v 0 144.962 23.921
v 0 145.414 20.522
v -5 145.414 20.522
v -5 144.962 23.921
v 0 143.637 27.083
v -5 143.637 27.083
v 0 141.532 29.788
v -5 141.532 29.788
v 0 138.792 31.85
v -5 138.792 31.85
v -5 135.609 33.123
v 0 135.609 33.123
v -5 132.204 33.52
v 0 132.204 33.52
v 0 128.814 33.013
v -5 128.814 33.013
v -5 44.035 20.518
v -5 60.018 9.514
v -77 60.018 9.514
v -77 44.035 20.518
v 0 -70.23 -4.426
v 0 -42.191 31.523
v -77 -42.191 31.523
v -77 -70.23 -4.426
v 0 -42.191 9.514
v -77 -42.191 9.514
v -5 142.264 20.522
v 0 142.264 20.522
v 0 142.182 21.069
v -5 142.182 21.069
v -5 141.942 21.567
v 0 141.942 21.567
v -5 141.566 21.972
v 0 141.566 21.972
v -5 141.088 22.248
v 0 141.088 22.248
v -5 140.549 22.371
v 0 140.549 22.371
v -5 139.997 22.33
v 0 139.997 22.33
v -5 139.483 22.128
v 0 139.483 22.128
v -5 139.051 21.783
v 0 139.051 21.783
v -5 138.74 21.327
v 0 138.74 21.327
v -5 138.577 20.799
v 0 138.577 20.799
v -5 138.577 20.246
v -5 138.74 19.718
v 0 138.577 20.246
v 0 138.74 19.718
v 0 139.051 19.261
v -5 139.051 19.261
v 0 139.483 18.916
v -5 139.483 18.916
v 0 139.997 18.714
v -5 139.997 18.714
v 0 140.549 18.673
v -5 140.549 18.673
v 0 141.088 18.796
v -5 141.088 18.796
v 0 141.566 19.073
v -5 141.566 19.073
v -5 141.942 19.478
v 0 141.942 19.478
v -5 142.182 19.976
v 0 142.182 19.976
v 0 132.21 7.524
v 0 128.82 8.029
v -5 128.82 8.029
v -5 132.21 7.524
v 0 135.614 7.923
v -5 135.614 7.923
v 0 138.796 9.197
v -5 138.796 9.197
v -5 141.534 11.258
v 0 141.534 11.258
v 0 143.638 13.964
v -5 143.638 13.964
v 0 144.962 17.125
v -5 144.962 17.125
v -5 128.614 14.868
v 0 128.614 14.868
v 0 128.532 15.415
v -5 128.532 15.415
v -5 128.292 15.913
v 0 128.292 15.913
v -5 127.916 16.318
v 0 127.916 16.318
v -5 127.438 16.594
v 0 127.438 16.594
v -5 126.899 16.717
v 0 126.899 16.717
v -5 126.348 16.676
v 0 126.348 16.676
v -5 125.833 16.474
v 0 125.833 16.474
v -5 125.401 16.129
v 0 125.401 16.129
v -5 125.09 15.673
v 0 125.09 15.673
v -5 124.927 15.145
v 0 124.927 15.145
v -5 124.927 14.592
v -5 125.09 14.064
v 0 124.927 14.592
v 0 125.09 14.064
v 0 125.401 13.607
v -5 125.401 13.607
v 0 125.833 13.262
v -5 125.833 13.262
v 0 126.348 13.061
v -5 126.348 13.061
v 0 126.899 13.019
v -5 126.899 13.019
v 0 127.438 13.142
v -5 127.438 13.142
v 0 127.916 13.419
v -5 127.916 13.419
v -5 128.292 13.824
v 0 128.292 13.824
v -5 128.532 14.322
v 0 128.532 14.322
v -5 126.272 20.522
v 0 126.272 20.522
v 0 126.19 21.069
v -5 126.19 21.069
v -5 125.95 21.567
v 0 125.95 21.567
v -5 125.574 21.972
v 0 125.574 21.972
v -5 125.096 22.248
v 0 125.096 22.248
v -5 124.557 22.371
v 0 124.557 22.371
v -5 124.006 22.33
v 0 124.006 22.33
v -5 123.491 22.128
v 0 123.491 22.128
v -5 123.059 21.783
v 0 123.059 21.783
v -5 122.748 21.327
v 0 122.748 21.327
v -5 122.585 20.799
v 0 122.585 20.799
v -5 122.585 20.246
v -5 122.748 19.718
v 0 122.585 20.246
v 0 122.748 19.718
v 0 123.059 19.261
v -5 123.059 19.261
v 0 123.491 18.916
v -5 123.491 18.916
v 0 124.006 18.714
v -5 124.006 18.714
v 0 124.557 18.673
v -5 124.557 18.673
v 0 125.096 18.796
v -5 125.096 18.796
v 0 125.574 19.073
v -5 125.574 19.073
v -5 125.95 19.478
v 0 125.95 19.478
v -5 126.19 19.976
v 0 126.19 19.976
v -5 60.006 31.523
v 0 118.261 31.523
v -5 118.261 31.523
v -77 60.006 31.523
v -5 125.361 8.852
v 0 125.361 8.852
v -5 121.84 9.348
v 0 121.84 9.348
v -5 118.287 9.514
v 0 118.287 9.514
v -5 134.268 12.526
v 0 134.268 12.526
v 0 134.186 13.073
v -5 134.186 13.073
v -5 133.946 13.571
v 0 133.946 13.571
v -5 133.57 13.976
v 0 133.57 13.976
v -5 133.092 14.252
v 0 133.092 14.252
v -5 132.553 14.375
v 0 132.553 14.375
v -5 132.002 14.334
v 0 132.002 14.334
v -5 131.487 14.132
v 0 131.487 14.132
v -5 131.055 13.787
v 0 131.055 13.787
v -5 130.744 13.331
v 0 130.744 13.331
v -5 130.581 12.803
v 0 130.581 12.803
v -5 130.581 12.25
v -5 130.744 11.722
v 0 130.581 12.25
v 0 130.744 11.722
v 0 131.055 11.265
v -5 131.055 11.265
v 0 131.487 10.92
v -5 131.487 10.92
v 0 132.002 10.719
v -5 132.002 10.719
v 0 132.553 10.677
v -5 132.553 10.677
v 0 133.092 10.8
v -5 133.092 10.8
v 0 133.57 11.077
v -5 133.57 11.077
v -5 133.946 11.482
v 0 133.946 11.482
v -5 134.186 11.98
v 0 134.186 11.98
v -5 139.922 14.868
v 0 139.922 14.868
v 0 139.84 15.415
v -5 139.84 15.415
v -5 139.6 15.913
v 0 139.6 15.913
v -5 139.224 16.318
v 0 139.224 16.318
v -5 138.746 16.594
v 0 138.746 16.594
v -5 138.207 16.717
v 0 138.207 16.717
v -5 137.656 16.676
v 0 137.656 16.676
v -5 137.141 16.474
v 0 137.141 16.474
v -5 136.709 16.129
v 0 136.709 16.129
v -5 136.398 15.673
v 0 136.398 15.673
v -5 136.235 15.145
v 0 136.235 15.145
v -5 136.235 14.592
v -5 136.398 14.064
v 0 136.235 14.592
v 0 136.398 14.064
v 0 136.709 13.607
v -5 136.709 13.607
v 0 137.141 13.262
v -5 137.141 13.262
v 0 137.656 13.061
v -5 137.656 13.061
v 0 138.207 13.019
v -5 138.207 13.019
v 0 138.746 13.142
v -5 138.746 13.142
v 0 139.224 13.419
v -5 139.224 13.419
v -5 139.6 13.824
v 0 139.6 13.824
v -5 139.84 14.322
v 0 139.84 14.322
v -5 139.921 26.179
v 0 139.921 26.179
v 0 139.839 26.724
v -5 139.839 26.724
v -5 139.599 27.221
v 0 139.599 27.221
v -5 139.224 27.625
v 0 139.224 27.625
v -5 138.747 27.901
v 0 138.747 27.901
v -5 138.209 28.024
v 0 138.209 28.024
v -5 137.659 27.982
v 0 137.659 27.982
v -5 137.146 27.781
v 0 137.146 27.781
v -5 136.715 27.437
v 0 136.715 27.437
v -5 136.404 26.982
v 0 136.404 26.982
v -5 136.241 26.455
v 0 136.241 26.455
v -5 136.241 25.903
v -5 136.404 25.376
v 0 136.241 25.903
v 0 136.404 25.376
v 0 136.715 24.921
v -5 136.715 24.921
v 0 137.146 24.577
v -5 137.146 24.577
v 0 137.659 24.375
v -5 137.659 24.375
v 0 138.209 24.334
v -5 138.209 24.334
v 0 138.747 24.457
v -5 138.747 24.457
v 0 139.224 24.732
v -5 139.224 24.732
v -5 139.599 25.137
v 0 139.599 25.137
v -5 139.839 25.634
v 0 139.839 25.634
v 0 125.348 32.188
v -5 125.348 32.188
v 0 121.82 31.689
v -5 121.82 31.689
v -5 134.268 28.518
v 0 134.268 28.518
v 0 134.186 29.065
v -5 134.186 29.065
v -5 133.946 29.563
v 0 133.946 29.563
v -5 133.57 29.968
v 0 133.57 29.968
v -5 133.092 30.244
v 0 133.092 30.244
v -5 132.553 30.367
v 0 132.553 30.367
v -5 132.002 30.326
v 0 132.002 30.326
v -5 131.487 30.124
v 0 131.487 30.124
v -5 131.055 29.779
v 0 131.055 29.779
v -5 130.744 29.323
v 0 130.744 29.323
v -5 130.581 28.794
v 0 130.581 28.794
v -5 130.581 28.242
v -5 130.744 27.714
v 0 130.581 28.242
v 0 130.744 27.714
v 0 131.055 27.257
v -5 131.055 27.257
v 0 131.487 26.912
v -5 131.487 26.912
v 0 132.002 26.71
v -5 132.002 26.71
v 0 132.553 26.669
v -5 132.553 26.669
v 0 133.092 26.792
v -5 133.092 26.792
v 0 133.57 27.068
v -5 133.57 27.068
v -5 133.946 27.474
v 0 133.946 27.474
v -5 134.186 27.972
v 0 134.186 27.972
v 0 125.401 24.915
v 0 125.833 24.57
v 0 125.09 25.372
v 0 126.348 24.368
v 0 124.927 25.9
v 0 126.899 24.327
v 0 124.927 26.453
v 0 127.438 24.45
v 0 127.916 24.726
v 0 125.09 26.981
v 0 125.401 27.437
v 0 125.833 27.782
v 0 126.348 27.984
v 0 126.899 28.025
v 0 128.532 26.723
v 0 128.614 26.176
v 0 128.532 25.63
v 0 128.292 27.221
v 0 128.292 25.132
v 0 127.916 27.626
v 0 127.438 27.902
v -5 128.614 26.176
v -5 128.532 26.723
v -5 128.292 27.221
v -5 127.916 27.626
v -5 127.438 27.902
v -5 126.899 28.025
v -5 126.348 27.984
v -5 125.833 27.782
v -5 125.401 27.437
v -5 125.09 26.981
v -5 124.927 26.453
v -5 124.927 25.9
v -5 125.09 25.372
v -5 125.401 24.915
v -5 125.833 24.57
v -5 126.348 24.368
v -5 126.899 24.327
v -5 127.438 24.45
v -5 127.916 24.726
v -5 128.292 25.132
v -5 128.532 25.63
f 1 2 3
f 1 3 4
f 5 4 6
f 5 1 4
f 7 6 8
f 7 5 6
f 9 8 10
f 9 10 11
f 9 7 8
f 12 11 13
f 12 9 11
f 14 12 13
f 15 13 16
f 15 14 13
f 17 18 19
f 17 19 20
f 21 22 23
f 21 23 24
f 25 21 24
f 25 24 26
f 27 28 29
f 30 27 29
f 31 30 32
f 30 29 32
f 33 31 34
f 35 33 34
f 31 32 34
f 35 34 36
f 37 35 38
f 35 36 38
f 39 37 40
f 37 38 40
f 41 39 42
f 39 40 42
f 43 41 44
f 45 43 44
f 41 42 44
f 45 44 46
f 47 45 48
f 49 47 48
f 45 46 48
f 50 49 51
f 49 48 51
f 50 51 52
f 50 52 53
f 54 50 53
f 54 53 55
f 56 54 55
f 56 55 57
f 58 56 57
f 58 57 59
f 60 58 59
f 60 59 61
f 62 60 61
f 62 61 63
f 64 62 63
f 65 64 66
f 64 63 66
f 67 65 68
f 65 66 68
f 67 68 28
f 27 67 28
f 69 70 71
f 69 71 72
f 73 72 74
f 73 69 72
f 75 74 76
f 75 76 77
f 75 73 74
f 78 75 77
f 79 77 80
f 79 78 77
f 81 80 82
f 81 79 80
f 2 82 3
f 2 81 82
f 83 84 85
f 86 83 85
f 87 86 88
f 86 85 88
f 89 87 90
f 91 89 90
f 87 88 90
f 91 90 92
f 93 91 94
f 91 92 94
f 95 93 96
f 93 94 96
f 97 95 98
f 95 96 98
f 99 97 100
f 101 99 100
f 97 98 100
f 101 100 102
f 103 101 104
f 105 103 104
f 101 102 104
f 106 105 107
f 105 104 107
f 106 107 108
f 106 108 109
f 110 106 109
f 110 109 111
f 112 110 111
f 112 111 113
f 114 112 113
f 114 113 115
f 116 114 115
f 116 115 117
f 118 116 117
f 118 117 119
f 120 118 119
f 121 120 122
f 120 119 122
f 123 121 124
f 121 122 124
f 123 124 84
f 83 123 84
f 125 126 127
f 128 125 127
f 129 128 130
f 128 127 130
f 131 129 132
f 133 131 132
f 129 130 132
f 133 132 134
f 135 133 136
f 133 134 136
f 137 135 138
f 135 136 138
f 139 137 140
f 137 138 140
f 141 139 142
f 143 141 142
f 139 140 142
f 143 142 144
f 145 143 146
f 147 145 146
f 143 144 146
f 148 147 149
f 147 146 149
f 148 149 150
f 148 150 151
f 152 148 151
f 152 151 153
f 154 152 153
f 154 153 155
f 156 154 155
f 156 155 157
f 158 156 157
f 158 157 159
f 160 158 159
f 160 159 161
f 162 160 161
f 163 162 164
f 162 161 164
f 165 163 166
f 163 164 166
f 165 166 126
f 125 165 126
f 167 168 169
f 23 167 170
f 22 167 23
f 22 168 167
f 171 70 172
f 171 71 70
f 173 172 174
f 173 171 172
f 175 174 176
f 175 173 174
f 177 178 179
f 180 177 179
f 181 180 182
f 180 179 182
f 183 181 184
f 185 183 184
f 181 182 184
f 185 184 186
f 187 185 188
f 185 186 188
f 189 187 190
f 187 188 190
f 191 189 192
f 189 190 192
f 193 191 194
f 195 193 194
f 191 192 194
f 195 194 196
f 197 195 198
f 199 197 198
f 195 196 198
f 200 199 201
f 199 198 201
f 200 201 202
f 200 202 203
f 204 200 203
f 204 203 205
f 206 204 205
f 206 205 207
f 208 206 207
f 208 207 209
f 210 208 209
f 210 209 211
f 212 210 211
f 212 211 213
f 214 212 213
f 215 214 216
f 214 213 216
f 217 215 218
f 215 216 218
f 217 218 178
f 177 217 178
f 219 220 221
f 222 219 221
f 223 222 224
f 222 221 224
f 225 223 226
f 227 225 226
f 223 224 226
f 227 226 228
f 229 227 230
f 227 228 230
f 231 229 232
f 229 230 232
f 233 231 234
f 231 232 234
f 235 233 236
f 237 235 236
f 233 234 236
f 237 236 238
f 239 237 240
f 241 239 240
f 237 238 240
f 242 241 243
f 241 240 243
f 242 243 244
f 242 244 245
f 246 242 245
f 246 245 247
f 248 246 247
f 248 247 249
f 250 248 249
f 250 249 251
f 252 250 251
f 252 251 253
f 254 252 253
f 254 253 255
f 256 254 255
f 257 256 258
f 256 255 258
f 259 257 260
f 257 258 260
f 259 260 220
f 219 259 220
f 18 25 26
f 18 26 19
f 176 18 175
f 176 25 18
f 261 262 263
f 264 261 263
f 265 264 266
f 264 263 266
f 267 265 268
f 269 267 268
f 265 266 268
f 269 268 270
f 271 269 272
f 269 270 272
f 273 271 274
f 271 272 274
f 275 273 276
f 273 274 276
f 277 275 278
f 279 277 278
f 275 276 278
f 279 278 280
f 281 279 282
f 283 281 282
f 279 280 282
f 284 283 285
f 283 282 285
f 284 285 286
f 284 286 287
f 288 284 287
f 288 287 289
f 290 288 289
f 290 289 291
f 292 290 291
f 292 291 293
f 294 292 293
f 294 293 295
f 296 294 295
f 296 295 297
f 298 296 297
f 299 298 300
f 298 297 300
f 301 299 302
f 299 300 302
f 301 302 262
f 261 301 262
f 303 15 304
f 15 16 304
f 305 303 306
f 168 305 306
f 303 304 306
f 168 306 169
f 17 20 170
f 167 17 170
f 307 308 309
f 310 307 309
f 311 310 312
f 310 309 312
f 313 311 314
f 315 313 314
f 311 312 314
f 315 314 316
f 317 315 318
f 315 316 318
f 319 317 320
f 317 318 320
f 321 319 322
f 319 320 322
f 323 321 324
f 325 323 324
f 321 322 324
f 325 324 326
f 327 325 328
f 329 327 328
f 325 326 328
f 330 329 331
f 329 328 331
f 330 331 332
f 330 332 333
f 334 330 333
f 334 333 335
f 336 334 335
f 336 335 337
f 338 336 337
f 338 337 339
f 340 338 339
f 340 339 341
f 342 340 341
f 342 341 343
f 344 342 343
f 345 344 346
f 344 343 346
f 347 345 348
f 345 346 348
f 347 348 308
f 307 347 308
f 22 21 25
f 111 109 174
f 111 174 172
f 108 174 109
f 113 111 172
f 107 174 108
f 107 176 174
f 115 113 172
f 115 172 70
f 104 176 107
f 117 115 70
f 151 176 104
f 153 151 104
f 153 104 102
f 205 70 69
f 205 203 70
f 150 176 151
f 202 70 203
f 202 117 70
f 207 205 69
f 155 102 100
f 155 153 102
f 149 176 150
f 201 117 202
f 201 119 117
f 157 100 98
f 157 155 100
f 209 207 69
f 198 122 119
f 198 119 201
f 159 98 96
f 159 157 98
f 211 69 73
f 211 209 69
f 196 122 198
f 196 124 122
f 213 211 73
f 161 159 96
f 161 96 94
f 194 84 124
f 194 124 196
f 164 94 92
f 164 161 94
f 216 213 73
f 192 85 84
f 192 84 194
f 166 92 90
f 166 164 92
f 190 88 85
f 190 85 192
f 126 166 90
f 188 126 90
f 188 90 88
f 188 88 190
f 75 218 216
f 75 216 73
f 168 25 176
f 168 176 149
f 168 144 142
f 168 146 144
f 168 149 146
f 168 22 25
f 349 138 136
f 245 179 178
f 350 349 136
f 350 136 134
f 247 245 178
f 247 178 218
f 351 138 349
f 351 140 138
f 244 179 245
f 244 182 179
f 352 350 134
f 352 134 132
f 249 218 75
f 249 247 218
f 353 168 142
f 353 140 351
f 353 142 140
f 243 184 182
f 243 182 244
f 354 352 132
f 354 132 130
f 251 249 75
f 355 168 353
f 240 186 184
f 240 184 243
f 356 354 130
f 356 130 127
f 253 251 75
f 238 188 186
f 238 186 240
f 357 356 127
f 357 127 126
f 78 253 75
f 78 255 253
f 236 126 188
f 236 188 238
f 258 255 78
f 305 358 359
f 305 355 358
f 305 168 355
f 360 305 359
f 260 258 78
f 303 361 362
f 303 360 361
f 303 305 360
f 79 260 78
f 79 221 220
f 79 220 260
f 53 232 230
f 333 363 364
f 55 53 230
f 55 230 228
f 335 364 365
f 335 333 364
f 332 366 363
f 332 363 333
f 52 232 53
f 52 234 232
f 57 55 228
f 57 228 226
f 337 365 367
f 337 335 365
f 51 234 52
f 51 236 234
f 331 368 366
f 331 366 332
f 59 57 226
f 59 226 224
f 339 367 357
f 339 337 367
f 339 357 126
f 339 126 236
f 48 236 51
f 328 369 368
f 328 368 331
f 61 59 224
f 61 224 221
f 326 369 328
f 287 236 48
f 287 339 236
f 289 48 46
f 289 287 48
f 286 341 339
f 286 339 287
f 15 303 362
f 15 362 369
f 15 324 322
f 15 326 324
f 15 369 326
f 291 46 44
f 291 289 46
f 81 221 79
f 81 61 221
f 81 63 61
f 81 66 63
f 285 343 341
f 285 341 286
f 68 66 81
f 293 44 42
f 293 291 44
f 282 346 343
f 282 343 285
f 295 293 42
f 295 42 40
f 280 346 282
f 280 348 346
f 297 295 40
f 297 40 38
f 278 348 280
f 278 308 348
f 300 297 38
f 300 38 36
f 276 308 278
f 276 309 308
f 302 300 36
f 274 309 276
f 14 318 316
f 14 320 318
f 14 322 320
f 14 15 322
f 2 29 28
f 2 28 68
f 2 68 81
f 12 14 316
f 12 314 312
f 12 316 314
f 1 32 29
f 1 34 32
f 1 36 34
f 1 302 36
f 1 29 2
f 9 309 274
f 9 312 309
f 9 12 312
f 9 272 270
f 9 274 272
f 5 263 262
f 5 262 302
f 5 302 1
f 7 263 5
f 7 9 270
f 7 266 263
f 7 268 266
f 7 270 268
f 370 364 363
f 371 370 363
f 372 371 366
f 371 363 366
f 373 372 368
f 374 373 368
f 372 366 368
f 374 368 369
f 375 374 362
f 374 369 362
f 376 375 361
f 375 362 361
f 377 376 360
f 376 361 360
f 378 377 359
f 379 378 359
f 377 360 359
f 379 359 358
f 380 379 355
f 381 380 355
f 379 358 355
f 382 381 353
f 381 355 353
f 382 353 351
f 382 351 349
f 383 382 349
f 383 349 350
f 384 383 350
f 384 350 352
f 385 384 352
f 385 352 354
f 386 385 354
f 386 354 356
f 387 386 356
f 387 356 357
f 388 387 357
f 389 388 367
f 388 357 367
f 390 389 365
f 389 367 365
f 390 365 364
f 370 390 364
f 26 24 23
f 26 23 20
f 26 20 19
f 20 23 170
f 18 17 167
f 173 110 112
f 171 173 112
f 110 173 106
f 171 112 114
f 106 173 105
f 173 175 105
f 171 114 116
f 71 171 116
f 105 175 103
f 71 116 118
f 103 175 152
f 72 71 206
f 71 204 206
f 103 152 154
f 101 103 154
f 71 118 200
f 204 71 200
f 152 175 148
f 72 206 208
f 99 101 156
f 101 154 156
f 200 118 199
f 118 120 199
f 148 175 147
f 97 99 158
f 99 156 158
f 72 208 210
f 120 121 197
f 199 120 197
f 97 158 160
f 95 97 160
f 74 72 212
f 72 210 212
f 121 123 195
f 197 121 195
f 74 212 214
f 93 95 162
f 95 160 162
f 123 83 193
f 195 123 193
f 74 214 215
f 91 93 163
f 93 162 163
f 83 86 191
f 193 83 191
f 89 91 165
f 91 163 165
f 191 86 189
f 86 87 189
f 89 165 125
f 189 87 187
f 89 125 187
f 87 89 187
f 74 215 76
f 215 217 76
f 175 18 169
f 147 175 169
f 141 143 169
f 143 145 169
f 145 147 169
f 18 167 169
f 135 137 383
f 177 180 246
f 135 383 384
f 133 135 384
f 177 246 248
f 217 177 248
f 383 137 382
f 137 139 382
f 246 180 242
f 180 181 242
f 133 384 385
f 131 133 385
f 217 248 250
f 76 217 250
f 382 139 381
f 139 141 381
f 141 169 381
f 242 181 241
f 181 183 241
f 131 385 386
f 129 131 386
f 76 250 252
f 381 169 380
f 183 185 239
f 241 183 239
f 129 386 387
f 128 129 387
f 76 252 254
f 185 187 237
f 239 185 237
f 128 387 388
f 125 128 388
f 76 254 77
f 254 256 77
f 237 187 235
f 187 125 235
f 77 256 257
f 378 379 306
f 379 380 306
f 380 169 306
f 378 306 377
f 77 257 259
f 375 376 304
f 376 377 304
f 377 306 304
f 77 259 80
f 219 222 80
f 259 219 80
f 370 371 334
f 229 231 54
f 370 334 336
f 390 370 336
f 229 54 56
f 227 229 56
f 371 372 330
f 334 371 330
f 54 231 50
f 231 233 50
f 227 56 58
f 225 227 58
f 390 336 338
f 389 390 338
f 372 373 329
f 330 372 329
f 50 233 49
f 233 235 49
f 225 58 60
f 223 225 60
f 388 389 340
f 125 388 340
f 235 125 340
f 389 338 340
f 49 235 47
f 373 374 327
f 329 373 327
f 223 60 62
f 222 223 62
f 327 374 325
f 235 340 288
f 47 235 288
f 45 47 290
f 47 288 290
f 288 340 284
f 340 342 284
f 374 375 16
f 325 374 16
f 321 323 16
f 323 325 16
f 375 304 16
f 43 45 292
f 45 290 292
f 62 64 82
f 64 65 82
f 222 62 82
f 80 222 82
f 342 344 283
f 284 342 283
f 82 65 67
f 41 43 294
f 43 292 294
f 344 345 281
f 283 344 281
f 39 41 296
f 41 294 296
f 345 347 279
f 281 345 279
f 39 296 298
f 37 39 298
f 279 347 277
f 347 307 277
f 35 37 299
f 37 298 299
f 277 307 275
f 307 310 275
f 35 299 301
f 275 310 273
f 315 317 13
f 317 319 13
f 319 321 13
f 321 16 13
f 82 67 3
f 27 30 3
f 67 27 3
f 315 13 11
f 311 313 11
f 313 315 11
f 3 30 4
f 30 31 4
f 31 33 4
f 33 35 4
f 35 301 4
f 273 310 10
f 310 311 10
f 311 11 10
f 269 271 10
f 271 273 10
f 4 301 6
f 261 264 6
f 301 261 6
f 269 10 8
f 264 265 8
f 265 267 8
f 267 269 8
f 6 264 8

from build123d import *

# Parameters (mm, degrees)
F2_DEPTH = 76.999998
F1_R     = 1.8542
F1_R_2   = 1.849996
F3_DEPTH = 4.99999
F4_R     = 38.1
F5_R     = 38.1


with BuildPart() as f2:
    # F0 (on Right) → F2 (new body)
    with BuildSketch(Plane.YZ):
        Polygon((60.006157, 31.522735), (-42.191276, 31.522735), (-70.230425, -4.425786), (-42.191276, 9.513999), (60.018324, 9.513999), (44.03463, 20.518491), align=None)
    extrude(amount=-F2_DEPTH)

    # F1 (on Right) → F3 (join)
    with BuildSketch(Plane.YZ):
        with BuildLine():
            ThreePointArc((145.413895, 20.522193), (138.69693, 31.902865), (125.487357, 31.522735))
            ThreePointArc((125.487357, 31.522735), (119.414457, 20.515007), (125.499524, 9.513999))
            ThreePointArc((125.499524, 9.513999), (138.703221, 9.144996), (145.413895, 20.522193))
        make_face()
        with Locations((132.414175, 12.526273)):
            Circle(F1_R, mode=Mode.SUBTRACT)
        with Locations((126.760205, 14.868224)):
            Circle(F1_R, mode=Mode.SUBTRACT)
        with Locations((138.068144, 14.868224)):
            Circle(F1_R, mode=Mode.SUBTRACT)
        with Locations((124.418255, 20.522193)):
            Circle(F1_R, mode=Mode.SUBTRACT)
        with Locations((140.410095, 20.522193)):
            Circle(F1_R, mode=Mode.SUBTRACT)
        with Locations((126.760205, 26.176162)):
            Circle(F1_R, mode=Mode.SUBTRACT)
        with Locations((138.070829, 26.178848)):
            Circle(F1_R_2, mode=Mode.SUBTRACT)
        with Locations((132.414175, 28.518113)):
            Circle(F1_R, mode=Mode.SUBTRACT)
        with BuildLine():
            Line((125.487357, 31.522735), (60.006157, 31.522735))
            Line((60.006157, 31.522735), (44.03463, 20.518491))
            Line((44.03463, 20.518491), (60.018324, 9.513999))
            Line((60.018324, 9.513999), (125.499524, 9.513999))
            ThreePointArc((125.499524, 9.513999), (119.414457, 20.515007), (125.487357, 31.522735))
        make_face()
    extrude(amount=-F3_DEPTH)

    # F4
    f4_edges = [f2.edges().sort_by_distance(p)[0] for p in [
        (-2.499995, 125.487357, 31.522735),
    ]]
    fillet(f4_edges, radius=F4_R)

    # F5
    f5_edges = [f2.edges().sort_by_distance(p)[0] for p in [
        (-2.499995, 125.499524, 9.513999),
    ]]
    fillet(f5_edges, radius=F5_R)


solid = f2.part
